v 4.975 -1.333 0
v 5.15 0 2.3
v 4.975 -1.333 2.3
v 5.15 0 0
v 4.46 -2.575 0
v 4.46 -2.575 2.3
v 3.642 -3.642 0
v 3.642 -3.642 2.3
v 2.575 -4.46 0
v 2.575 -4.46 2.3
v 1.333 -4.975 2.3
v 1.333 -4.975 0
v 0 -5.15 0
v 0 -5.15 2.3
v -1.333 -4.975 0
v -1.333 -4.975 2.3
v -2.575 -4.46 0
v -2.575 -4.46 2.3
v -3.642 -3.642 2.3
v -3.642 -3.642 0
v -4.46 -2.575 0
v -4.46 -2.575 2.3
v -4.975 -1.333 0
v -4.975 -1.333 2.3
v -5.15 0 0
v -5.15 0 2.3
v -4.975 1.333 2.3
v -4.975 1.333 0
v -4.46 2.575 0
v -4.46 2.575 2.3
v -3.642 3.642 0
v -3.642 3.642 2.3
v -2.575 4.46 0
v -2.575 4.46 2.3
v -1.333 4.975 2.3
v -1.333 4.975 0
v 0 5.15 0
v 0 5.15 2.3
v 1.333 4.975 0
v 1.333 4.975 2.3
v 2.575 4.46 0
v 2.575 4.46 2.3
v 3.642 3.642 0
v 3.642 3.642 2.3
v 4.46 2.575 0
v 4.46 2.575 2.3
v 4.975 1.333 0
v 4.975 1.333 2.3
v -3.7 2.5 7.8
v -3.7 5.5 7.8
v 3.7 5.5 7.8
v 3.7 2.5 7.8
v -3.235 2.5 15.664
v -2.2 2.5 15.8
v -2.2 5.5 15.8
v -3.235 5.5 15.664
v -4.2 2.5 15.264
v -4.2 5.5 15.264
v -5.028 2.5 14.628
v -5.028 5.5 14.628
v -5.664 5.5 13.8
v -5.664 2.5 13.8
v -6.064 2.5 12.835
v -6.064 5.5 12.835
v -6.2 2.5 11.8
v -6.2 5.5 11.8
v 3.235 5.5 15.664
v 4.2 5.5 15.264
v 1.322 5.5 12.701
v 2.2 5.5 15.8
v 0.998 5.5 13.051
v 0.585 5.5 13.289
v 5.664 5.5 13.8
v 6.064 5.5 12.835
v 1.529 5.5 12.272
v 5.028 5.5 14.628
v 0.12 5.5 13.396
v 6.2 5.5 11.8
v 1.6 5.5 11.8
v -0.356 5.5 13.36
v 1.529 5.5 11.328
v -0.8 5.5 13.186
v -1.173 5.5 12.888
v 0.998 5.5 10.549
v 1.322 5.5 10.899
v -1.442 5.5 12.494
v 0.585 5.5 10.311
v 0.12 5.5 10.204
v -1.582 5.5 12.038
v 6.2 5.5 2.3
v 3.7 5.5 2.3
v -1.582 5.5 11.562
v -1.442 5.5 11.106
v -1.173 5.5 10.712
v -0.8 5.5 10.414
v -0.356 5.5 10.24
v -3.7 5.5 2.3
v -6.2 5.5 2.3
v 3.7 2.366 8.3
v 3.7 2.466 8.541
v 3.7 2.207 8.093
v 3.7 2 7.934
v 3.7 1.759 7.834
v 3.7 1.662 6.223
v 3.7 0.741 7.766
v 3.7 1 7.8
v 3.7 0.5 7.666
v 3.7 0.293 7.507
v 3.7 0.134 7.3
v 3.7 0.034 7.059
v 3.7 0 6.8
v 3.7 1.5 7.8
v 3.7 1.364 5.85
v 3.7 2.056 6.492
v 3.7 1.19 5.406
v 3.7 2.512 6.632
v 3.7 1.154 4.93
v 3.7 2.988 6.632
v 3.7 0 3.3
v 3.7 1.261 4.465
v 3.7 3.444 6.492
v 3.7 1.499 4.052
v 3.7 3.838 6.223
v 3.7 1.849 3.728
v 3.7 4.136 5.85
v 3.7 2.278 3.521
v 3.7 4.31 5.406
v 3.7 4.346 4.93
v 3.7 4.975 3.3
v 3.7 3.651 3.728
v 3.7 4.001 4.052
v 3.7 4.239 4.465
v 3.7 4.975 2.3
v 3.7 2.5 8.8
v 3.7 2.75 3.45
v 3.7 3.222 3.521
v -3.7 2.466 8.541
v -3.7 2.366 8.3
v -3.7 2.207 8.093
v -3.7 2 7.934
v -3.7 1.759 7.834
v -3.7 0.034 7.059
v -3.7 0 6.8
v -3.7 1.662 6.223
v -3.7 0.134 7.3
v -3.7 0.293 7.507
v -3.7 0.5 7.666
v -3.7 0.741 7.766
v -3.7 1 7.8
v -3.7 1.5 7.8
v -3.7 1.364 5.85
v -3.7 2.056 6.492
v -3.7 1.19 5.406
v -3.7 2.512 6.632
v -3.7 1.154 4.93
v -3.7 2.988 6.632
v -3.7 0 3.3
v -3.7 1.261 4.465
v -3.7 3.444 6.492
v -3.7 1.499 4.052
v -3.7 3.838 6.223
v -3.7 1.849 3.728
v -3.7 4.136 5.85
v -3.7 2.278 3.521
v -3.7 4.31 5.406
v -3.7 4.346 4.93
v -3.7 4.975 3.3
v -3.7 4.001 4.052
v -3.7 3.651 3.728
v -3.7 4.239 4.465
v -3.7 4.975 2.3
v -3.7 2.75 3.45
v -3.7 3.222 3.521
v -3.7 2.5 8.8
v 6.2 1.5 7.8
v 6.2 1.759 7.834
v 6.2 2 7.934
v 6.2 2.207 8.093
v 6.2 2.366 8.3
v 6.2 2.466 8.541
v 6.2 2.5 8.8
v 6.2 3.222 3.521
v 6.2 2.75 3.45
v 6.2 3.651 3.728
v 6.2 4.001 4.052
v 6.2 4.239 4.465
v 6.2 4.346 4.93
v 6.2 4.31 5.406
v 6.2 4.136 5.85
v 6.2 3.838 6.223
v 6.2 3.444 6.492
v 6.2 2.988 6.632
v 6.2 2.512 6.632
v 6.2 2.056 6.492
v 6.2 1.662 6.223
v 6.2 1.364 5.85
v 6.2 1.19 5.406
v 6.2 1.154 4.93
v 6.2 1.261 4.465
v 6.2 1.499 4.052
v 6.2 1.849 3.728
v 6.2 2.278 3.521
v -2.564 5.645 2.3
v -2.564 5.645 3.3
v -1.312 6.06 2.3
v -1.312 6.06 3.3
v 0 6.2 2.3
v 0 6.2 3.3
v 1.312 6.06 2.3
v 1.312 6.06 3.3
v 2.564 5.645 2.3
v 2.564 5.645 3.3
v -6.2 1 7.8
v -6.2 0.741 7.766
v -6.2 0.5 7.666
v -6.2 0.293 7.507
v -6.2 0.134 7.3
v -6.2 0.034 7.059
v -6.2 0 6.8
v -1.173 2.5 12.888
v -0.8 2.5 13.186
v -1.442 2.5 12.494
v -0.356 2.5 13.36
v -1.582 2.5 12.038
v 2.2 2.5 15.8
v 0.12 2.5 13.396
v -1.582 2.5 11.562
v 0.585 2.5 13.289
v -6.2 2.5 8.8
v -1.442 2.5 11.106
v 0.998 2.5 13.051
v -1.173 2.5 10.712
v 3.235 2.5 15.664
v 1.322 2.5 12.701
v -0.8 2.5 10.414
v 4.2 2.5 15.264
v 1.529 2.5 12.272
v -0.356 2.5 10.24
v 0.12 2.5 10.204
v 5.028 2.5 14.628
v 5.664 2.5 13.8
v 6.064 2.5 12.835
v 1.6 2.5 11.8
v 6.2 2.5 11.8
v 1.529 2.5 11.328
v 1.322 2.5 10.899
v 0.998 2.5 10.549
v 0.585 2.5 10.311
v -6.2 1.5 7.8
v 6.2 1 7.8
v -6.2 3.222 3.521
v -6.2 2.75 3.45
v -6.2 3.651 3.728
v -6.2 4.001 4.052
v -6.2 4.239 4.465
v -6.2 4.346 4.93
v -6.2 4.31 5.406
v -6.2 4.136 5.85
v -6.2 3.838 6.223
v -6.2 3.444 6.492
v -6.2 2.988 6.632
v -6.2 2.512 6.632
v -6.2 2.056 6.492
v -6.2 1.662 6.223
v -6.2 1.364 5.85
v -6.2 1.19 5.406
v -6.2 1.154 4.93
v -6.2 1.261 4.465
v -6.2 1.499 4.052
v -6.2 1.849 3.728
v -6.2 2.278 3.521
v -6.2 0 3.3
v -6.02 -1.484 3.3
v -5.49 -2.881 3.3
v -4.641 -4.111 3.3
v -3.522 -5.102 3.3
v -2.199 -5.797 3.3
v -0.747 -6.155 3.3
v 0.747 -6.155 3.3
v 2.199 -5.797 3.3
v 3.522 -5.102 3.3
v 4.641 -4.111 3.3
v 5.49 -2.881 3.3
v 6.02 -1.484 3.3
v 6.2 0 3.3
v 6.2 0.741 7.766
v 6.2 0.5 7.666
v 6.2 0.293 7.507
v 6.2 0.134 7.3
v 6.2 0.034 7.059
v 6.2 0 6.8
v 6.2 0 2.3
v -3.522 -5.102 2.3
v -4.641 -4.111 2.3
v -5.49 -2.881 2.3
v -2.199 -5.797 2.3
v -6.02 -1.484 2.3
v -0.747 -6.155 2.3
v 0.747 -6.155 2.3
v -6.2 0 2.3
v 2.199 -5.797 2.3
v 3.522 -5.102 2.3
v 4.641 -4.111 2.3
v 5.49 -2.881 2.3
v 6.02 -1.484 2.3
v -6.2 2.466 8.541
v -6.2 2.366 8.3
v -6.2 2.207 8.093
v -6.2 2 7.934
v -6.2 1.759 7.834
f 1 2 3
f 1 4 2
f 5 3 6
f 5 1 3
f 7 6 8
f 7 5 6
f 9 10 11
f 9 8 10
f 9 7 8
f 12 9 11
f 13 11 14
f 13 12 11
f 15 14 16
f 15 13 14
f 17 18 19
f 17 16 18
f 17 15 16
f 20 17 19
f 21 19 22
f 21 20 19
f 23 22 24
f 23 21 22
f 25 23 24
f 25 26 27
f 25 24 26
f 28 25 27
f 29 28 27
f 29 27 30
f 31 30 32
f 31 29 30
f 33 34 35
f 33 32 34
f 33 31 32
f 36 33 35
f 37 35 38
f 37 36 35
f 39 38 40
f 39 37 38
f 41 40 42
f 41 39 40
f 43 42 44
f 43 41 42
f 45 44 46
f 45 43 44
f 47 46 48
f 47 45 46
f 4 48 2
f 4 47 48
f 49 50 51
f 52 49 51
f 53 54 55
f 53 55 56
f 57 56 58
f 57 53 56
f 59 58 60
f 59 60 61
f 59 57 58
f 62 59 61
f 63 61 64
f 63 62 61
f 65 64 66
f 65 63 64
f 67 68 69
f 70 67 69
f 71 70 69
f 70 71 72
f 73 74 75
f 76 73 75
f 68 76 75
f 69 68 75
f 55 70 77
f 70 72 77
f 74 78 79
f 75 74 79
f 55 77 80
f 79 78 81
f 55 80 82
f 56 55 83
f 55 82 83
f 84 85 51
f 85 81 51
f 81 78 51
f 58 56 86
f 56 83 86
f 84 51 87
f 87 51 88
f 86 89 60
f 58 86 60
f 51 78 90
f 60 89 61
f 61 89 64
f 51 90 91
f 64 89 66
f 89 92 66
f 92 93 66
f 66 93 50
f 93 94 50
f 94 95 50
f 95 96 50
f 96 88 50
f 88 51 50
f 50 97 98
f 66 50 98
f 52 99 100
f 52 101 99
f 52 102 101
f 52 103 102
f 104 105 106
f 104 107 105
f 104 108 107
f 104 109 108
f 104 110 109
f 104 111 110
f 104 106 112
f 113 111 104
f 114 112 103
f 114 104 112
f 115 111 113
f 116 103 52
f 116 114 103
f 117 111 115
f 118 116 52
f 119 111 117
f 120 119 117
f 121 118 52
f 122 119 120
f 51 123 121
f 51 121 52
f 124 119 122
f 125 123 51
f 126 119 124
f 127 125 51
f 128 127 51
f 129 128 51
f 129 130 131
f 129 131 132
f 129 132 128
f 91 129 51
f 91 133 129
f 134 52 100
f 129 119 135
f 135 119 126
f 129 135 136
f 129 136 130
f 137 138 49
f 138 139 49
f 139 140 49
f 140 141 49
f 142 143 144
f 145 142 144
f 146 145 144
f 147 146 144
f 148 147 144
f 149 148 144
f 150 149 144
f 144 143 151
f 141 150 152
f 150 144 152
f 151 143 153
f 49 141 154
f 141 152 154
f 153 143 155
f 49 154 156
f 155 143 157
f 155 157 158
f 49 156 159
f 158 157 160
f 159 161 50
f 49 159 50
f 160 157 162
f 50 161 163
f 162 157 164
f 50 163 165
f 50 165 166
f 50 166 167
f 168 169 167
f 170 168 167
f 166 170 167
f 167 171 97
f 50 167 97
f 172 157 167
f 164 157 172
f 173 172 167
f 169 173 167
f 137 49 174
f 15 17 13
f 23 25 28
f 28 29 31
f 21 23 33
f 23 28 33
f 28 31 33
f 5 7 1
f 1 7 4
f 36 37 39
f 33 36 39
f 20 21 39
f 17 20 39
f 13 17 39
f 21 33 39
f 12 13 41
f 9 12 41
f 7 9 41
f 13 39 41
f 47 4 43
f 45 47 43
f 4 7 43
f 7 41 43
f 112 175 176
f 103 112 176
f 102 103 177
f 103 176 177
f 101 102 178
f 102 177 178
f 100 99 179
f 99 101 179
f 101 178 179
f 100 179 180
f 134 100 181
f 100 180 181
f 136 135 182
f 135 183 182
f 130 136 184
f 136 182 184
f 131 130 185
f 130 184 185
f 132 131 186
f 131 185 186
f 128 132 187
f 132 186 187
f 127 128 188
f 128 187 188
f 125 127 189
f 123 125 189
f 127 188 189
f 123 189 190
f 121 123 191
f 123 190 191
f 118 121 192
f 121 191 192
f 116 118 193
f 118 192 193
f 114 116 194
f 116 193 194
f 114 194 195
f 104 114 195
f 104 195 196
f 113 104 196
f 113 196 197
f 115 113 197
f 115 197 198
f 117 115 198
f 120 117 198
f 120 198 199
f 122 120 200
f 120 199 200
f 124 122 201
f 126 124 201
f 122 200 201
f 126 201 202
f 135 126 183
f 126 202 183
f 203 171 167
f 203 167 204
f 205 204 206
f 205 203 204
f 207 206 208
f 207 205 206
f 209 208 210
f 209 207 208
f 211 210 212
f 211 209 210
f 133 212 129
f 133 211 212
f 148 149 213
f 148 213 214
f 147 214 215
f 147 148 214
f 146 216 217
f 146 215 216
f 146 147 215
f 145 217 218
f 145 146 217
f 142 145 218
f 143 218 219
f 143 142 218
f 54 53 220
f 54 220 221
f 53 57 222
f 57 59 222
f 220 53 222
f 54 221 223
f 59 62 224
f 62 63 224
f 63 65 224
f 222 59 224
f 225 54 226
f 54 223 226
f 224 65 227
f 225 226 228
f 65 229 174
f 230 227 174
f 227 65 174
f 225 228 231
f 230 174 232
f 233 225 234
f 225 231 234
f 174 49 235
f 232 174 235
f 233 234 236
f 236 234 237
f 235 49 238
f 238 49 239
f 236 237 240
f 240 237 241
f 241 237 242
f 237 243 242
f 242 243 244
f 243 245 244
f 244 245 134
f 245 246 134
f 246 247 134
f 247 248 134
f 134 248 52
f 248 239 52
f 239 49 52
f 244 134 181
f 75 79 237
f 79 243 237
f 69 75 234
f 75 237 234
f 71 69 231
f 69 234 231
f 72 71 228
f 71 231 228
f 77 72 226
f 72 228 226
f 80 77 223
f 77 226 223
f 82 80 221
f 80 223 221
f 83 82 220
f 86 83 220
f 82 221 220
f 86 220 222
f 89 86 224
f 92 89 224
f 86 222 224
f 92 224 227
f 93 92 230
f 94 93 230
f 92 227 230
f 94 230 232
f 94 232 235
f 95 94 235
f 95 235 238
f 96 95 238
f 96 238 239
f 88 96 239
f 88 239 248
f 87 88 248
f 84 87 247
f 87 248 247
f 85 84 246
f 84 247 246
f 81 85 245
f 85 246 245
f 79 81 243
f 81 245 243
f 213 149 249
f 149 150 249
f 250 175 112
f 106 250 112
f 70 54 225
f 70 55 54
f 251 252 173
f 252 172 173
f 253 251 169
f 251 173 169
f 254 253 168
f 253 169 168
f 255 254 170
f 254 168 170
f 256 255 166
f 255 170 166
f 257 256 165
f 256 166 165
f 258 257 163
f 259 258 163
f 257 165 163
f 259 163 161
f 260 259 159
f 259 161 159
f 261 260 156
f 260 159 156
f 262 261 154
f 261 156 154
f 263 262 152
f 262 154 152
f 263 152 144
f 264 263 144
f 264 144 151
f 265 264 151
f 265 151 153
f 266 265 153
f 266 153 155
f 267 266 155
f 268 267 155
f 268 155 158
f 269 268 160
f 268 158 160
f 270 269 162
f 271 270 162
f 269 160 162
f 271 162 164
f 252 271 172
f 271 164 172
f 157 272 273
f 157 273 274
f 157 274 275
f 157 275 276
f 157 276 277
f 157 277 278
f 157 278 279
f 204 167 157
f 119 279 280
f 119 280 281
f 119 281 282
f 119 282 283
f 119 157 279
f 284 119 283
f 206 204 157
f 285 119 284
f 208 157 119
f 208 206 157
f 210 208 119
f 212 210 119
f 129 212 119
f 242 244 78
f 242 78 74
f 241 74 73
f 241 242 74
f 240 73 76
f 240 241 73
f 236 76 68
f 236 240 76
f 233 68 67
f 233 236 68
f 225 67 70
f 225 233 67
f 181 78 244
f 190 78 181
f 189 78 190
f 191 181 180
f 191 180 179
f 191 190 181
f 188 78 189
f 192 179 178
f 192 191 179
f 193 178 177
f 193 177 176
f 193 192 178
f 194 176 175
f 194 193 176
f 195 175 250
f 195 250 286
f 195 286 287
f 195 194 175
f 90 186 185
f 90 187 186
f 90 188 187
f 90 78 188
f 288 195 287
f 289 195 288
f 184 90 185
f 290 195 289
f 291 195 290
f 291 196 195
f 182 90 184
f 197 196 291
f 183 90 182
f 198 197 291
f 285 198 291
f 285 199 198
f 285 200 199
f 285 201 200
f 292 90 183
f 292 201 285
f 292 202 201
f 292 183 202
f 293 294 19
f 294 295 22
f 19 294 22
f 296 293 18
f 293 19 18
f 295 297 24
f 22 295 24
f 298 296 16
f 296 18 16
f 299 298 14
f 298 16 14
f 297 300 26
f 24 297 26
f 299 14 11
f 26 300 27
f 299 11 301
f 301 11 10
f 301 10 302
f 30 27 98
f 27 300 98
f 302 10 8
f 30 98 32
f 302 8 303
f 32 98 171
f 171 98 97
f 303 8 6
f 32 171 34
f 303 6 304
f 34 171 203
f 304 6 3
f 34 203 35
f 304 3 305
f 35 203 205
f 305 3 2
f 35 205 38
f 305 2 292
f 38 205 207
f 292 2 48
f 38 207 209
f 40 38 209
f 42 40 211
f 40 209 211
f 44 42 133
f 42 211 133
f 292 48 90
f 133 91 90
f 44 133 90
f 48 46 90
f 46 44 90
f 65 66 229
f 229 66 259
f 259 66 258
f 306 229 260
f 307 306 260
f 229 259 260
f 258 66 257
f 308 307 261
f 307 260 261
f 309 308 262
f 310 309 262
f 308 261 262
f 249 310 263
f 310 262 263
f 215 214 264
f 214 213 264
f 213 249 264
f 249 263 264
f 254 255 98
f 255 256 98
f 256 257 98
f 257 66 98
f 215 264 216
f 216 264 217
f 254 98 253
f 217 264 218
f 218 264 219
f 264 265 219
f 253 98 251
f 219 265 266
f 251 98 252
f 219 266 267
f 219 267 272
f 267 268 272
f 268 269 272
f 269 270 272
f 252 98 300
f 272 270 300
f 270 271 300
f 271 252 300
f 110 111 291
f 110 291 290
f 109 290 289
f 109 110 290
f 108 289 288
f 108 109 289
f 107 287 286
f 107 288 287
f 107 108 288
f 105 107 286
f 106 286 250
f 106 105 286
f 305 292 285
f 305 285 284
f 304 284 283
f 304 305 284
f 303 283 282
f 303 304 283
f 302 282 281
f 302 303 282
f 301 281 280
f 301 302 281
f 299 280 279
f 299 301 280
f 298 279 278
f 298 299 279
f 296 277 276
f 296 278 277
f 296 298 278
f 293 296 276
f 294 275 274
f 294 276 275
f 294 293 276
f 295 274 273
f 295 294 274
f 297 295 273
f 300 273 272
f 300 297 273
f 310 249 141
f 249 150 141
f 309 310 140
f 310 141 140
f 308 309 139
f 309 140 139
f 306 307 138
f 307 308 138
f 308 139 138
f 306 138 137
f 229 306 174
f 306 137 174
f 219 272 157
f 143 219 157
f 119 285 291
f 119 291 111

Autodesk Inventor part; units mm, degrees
ref_plane "YZ Plane" through (0, 0, 0) normal (1, 0, 0) x (0, 1, 0)
ref_plane "XZ Plane" through (0, 0, 0) normal (0, 1, 0) x (-1, 0, 0)
ref_plane "XY Plane" through (0, 0, 0) normal (0, 0, 1) x (1, 0, 0)
sketch "Sketch1" plane through (0, 0, 0) normal (0, 0, 1) x (1, 0, 0)
  circle A0 centre (0, 0) radius 5.15
  dimension "d0" = 10.3
extrude "Extrusion1" add sketch "Sketch1" along normal blind 2.3
sketch "Sketch2" plane through (0, 0, 2.3) normal (0, 0, 1) x (1, 0, 0)
  circle A0 centre (0, 0) radius 6.2
  dimension "d3" = 12.4
extrude "Extrusion2" add sketch "Sketch2" along normal blind 1
sketch "Sketch3" plane through (0, 0, 2.3) normal (0, 0, -1) x (-1, 0, 0)
  circle A0 centre (0, 0) radius 6.2 construction
  line L0 (6.2, 0) -> (3.7, 0)
  line L1 (3.7, 0) -> (3.7, 5.5)
  line L2 (3.7, 5.5) -> (6.2, 5.5)
  line L3 (6.2, 5.5) -> (6.2, 0)
  line L4 (0, -6.2) -> (0, 6.2)
  circle A1 centre (0, 0) radius 6.2 construction
  line L5 (-6.2, 0) -> (-3.7, 0)
  line L6 (-3.7, 0) -> (-3.7, 5.5)
  line L7 (-3.7, 5.5) -> (-6.2, 5.5)
  line L8 (-6.2, 5.5) -> (-6.2, 0)
  dimension "d6" = 5.5
  dimension "d7" = 2.5
extrude "Extrusion3" add sketch "Sketch3" against normal blind 5.5
sketch "Sketch4" plane through (6.2, 0, 2.3) normal (1, 0, 0) x (0, 0, -1)
  line L0 (0, 5.5) -> (0, 0) construction
  line L1 (0, 5.5) -> (-5.5, 5.5) construction
  line L2 (-5.5, 0) -> (-5.5, 5.5) construction
  line L3 (-1, 0) -> (-5.5, 0) construction
  line L4 (0, 0) -> (-1, 0) construction
  line L5 (-5.5, 0) -> (-5.5, 5.5) construction
  line L6 (0, 5.5) -> (-5.5, 0) construction
  line L7 (0, -6.2) -> (0, 0) construction
  line L8 (-5.5, 5.5) -> (0, 0) construction
  circle A0 centre (-2.75, 2.75) radius 1.6
  point P0 (2.3, 0)
  dimension "d10" = 3.2
extrude "Extrusion4" cut sketch "Sketch4" against normal through all
fillet "Fillet1" radius 1 2 edges at (4.95, 0, 7.8) (-4.95, 0, 7.8)
sketch "Sketch5" plane through (0, 0, 7.8) normal (0, 0, 1) x (1, 0, 0)
  line L0 (6.2, 1) -> (3.7, 1) construction
  line L1 (6.2, 1) -> (6.2, 5.5) construction
  line L2 (6.2, 5.5) -> (3.7, 5.5) construction
  line L3 (3.7, 5.5) -> (3.7, 1) construction
  line L4 (-3.7, 1) -> (-6.2, 1) construction
  line L5 (-3.7, 1) -> (-3.7, 5.5) construction
  line L6 (-3.7, 5.5) -> (-6.2, 5.5) construction
  line L7 (-6.2, 5.5) -> (-6.2, 1) construction
  line L8 (6.2, 5.5) -> (6.2, 0) projected
  line L9 (-6.2, 5.5) -> (-6.2, 0) projected
  line L10 (6.2, 5.5) -> (-6.2, 5.5)
  line L11 (-6.2, 5.5) -> (-6.2, 2.5)
  line L12 (-6.2, 2.5) -> (6.2, 2.5)
  line L13 (6.2, 2.5) -> (6.2, 5.5)
  point P0 (0, 0)
  dimension "d14" = 3
extrude "Extrusion5" add sketch "Sketch5" along normal blind 8
fillet "Fillet2" radius 1 2 edges at (-4.95, 2.5, 7.8) (4.95, 2.5, 7.8)
fillet "Fillet3" radius 4 2 edges at (-6.2, 4, 15.8) (6.2, 4, 15.8)
sketch "Sketch6" plane through (-3.7, 2.5, 7.8) normal (0, -1, 0) x (1, 0, 0)
  line L0 (3.7, -7.8) -> (3.7, 7.2594)
  line L1 (0, 0) -> (7.4, 0) construction
  arc A0 (9.9, 4) -> (5.9, 8) centre (5.9, 4) ccw construction
  line L2 (1.5, 8) -> (5.9, 8) construction
  arc A1 (1.5, 8) -> (-2.5, 4) centre (1.5, 4) ccw construction
  line L3 (-2.5, 1) -> (-2.5, 4) construction
  line L4 (0, 1) -> (-2.5, 1) construction
  line L5 (0, 1) -> (0, 0) construction
  line L6 (0, 0) -> (7.4, 0) construction
  line L7 (7.4, 0) -> (7.4, 1) construction
  line L8 (9.9, 1) -> (7.4, 1) construction
  line L9 (9.9, 1) -> (9.9, 4) construction
  line L10 (-6.2522, 4) -> (14.3588, 4) construction
  circle A2 centre (3.7, 4) radius 1.6
  circle A3 centre (3.7, 4) radius 4 construction
  dimension "d19" = 4
  dimension "d20" = 3.2
  dimension "d23" = 8
extrude "Extrusion6" cut sketch "Sketch6" against normal through all
properties part number "magnet-holder-end"
